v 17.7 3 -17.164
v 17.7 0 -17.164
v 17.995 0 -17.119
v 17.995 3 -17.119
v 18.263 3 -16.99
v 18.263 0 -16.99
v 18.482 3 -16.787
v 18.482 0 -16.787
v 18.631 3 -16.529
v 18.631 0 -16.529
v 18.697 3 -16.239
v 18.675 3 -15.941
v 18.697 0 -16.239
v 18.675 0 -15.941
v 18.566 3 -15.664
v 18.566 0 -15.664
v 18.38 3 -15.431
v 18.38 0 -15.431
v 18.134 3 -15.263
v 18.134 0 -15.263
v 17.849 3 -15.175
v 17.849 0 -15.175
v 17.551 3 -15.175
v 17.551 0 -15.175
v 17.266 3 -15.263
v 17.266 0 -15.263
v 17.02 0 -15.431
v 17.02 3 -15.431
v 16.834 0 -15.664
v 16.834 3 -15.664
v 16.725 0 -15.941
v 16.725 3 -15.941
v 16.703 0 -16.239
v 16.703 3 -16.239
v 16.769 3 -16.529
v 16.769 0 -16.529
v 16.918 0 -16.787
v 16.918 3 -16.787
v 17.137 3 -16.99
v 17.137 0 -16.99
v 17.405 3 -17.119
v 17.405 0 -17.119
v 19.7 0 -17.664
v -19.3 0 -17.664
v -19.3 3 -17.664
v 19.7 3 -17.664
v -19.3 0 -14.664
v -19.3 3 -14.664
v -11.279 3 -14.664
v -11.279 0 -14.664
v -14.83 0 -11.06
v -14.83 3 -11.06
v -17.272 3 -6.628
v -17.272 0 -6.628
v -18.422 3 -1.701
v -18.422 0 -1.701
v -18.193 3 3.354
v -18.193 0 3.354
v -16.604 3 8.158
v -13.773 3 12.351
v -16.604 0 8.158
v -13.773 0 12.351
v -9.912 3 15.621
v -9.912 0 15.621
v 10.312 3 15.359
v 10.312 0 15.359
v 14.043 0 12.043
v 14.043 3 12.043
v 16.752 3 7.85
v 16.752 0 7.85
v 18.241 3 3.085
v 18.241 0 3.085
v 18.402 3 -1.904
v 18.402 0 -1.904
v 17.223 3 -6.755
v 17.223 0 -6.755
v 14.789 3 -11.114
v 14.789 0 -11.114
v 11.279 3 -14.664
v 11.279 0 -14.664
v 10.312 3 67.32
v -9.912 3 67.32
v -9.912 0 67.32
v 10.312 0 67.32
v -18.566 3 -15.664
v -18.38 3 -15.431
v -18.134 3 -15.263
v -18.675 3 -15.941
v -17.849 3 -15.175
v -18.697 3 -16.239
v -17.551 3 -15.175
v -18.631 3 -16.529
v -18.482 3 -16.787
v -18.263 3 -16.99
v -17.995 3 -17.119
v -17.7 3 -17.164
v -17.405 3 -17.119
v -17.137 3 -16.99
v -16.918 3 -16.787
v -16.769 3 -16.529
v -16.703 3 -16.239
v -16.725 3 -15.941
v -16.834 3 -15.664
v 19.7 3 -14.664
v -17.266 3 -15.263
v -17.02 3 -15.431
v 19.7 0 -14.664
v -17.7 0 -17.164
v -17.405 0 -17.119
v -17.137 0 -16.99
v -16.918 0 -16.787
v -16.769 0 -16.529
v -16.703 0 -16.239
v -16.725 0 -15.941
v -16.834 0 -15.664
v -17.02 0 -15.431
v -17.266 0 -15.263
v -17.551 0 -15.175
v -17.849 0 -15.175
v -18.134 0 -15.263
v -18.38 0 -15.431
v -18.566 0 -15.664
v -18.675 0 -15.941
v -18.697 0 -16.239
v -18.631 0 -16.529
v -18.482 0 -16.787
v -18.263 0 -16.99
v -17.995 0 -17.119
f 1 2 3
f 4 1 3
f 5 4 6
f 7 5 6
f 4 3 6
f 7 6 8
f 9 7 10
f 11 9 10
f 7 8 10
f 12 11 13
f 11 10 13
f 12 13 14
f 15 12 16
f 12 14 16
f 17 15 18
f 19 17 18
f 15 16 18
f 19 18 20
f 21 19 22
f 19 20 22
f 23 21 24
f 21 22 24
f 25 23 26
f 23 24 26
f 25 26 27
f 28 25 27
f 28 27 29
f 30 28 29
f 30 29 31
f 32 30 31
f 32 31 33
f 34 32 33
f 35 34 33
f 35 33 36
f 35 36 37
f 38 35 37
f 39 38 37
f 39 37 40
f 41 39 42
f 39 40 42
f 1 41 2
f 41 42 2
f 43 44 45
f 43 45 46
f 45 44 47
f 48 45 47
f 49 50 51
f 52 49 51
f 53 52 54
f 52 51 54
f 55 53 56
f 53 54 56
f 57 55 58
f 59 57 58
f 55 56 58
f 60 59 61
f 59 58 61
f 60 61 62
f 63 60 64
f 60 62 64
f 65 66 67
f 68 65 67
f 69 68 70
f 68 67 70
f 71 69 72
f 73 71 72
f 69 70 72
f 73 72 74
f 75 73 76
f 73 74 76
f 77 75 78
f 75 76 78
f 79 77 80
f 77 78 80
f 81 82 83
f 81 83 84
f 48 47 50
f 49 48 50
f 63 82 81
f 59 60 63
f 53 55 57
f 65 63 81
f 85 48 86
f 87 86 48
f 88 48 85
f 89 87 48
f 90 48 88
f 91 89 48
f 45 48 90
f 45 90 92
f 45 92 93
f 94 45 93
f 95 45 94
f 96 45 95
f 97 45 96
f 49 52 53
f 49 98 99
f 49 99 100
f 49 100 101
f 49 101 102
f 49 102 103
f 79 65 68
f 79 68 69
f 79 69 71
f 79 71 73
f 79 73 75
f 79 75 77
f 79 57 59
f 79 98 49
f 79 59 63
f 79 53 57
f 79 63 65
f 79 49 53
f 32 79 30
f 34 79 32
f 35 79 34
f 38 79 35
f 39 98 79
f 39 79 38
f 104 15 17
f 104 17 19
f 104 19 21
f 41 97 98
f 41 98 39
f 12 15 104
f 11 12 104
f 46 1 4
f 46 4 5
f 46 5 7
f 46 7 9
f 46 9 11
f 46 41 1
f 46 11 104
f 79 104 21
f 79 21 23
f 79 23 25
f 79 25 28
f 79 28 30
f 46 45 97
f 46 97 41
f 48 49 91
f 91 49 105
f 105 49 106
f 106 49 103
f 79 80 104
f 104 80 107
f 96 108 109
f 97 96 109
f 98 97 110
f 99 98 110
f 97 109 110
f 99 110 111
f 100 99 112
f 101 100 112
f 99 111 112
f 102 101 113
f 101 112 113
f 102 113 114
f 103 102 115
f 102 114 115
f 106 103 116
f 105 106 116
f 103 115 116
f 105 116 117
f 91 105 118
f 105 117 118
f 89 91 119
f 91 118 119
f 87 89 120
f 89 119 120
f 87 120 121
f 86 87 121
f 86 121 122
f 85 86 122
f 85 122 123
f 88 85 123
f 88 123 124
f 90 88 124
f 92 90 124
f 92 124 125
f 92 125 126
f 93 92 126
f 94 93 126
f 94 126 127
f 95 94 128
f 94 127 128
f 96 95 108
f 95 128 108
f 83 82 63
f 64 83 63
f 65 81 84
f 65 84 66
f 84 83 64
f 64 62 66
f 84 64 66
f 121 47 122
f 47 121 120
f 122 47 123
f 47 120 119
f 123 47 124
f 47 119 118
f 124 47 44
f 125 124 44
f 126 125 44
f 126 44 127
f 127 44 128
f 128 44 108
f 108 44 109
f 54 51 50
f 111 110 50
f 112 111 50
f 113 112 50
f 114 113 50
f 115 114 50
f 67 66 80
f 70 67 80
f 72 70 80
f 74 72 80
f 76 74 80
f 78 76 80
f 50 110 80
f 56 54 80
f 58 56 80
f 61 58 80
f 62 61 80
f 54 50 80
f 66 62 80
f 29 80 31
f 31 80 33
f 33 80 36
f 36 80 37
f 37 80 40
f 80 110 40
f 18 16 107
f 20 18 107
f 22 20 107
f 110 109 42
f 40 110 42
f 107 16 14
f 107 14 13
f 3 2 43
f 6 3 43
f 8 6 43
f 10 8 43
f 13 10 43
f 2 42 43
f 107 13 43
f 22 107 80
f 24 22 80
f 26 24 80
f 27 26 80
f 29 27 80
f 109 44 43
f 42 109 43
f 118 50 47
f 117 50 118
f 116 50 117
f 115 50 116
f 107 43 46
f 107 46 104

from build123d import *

# Parameters (mm, degrees)
SKETCH1_R           = 18.5
BOSS_EXTRUDE1_DEPTH = 3
SKETCH2_W           = 20.223748417
SKETCH2_H           = 1.96058716
BOSS_EXTRUDE2_DEPTH = 3
CUT_EXTRUDE1_DEPTH  = 3
SKETCH4_W           = 39
SKETCH4_H           = 3
BOSS_EXTRUDE3_DEPTH = 3
CUT_EXTRUDE2_DEPTH  = 3
SKETCH6_R           = 1
CUT_EXTRUDE3_DEPTH  = 3
SKETCH8_W           = 20.223748417
SKETCH8_H           = 50
BOSS_EXTRUDE4_DEPTH = 3


with BuildPart() as part:
    # Sketch1 → Boss-Extrude1 (new body)
    with BuildSketch(Plane(origin=(0, 0, 0), x_dir=(1, 0, 0), z_dir=(0, 1, 0))):
        with Locations(Location((0, 0, 0), (0, 0, 270))):
            Circle(SKETCH1_R)
    extrude(amount=BOSS_EXTRUDE1_DEPTH)

    # Sketch2 → Boss-Extrude2 (add)
    with BuildSketch(Plane.XZ):
        with Locations((0.2001438, 16.339729918)):
            Rectangle(SKETCH2_W, SKETCH2_H)
    extrude(amount=-BOSS_EXTRUDE2_DEPTH)

    # Sketch3 → Cut-Extrude1 (cut)
    with BuildSketch(Plane.XZ):
        with BuildLine():
            Line((6.501291106, 17.320023498), (-6.501291106, 17.320023498))
            ThreePointArc((-6.501291106, 17.320023498), (0, 18.5), (6.501291106, 17.320023498))
        make_face()
    extrude(amount=-CUT_EXTRUDE1_DEPTH, mode=Mode.SUBTRACT)

    # Sketch4 → Boss-Extrude3 (add)
    with BuildSketch(Plane.XZ):
        with Locations((0.200143799, -16.163843272)):
            Rectangle(SKETCH4_W, SKETCH4_H)
    extrude(amount=-BOSS_EXTRUDE3_DEPTH)

    # Sketch5 → Cut-Extrude2 (cut)
    with BuildSketch(Plane.XZ):
        with BuildLine():
            Line((5.498967254, -17.663843272), (-5.498967254, -17.663843272))
            ThreePointArc((-5.498967254, -17.663843272), (0, -18.5), (5.498967254, -17.663843272))
        make_face()
    extrude(amount=-CUT_EXTRUDE2_DEPTH, mode=Mode.SUBTRACT)

    # Sketch6 → Cut-Extrude3 (cut)
    with BuildSketch(Plane.XZ):
        with Locations(Location((17.700143799, -16.163843272, 0), (0, 0, 270))):
            Circle(SKETCH6_R)
        with Locations(Location((-17.700143799, -16.163843272, 0), (0, 0, 270))):
            Circle(SKETCH6_R)
    extrude(amount=-CUT_EXTRUDE3_DEPTH, mode=Mode.SUBTRACT)

    # Sketch8 → Boss-Extrude4 (add)
    with BuildSketch(Plane(origin=(0, 3, 0), x_dir=(1, 0, 0), z_dir=(0, 1, 0))):
        with Locations((0.2001438, -42.320023498)):
            Rectangle(SKETCH8_W, SKETCH8_H)
    extrude(amount=-BOSS_EXTRUDE4_DEPTH)


solid = part.part
